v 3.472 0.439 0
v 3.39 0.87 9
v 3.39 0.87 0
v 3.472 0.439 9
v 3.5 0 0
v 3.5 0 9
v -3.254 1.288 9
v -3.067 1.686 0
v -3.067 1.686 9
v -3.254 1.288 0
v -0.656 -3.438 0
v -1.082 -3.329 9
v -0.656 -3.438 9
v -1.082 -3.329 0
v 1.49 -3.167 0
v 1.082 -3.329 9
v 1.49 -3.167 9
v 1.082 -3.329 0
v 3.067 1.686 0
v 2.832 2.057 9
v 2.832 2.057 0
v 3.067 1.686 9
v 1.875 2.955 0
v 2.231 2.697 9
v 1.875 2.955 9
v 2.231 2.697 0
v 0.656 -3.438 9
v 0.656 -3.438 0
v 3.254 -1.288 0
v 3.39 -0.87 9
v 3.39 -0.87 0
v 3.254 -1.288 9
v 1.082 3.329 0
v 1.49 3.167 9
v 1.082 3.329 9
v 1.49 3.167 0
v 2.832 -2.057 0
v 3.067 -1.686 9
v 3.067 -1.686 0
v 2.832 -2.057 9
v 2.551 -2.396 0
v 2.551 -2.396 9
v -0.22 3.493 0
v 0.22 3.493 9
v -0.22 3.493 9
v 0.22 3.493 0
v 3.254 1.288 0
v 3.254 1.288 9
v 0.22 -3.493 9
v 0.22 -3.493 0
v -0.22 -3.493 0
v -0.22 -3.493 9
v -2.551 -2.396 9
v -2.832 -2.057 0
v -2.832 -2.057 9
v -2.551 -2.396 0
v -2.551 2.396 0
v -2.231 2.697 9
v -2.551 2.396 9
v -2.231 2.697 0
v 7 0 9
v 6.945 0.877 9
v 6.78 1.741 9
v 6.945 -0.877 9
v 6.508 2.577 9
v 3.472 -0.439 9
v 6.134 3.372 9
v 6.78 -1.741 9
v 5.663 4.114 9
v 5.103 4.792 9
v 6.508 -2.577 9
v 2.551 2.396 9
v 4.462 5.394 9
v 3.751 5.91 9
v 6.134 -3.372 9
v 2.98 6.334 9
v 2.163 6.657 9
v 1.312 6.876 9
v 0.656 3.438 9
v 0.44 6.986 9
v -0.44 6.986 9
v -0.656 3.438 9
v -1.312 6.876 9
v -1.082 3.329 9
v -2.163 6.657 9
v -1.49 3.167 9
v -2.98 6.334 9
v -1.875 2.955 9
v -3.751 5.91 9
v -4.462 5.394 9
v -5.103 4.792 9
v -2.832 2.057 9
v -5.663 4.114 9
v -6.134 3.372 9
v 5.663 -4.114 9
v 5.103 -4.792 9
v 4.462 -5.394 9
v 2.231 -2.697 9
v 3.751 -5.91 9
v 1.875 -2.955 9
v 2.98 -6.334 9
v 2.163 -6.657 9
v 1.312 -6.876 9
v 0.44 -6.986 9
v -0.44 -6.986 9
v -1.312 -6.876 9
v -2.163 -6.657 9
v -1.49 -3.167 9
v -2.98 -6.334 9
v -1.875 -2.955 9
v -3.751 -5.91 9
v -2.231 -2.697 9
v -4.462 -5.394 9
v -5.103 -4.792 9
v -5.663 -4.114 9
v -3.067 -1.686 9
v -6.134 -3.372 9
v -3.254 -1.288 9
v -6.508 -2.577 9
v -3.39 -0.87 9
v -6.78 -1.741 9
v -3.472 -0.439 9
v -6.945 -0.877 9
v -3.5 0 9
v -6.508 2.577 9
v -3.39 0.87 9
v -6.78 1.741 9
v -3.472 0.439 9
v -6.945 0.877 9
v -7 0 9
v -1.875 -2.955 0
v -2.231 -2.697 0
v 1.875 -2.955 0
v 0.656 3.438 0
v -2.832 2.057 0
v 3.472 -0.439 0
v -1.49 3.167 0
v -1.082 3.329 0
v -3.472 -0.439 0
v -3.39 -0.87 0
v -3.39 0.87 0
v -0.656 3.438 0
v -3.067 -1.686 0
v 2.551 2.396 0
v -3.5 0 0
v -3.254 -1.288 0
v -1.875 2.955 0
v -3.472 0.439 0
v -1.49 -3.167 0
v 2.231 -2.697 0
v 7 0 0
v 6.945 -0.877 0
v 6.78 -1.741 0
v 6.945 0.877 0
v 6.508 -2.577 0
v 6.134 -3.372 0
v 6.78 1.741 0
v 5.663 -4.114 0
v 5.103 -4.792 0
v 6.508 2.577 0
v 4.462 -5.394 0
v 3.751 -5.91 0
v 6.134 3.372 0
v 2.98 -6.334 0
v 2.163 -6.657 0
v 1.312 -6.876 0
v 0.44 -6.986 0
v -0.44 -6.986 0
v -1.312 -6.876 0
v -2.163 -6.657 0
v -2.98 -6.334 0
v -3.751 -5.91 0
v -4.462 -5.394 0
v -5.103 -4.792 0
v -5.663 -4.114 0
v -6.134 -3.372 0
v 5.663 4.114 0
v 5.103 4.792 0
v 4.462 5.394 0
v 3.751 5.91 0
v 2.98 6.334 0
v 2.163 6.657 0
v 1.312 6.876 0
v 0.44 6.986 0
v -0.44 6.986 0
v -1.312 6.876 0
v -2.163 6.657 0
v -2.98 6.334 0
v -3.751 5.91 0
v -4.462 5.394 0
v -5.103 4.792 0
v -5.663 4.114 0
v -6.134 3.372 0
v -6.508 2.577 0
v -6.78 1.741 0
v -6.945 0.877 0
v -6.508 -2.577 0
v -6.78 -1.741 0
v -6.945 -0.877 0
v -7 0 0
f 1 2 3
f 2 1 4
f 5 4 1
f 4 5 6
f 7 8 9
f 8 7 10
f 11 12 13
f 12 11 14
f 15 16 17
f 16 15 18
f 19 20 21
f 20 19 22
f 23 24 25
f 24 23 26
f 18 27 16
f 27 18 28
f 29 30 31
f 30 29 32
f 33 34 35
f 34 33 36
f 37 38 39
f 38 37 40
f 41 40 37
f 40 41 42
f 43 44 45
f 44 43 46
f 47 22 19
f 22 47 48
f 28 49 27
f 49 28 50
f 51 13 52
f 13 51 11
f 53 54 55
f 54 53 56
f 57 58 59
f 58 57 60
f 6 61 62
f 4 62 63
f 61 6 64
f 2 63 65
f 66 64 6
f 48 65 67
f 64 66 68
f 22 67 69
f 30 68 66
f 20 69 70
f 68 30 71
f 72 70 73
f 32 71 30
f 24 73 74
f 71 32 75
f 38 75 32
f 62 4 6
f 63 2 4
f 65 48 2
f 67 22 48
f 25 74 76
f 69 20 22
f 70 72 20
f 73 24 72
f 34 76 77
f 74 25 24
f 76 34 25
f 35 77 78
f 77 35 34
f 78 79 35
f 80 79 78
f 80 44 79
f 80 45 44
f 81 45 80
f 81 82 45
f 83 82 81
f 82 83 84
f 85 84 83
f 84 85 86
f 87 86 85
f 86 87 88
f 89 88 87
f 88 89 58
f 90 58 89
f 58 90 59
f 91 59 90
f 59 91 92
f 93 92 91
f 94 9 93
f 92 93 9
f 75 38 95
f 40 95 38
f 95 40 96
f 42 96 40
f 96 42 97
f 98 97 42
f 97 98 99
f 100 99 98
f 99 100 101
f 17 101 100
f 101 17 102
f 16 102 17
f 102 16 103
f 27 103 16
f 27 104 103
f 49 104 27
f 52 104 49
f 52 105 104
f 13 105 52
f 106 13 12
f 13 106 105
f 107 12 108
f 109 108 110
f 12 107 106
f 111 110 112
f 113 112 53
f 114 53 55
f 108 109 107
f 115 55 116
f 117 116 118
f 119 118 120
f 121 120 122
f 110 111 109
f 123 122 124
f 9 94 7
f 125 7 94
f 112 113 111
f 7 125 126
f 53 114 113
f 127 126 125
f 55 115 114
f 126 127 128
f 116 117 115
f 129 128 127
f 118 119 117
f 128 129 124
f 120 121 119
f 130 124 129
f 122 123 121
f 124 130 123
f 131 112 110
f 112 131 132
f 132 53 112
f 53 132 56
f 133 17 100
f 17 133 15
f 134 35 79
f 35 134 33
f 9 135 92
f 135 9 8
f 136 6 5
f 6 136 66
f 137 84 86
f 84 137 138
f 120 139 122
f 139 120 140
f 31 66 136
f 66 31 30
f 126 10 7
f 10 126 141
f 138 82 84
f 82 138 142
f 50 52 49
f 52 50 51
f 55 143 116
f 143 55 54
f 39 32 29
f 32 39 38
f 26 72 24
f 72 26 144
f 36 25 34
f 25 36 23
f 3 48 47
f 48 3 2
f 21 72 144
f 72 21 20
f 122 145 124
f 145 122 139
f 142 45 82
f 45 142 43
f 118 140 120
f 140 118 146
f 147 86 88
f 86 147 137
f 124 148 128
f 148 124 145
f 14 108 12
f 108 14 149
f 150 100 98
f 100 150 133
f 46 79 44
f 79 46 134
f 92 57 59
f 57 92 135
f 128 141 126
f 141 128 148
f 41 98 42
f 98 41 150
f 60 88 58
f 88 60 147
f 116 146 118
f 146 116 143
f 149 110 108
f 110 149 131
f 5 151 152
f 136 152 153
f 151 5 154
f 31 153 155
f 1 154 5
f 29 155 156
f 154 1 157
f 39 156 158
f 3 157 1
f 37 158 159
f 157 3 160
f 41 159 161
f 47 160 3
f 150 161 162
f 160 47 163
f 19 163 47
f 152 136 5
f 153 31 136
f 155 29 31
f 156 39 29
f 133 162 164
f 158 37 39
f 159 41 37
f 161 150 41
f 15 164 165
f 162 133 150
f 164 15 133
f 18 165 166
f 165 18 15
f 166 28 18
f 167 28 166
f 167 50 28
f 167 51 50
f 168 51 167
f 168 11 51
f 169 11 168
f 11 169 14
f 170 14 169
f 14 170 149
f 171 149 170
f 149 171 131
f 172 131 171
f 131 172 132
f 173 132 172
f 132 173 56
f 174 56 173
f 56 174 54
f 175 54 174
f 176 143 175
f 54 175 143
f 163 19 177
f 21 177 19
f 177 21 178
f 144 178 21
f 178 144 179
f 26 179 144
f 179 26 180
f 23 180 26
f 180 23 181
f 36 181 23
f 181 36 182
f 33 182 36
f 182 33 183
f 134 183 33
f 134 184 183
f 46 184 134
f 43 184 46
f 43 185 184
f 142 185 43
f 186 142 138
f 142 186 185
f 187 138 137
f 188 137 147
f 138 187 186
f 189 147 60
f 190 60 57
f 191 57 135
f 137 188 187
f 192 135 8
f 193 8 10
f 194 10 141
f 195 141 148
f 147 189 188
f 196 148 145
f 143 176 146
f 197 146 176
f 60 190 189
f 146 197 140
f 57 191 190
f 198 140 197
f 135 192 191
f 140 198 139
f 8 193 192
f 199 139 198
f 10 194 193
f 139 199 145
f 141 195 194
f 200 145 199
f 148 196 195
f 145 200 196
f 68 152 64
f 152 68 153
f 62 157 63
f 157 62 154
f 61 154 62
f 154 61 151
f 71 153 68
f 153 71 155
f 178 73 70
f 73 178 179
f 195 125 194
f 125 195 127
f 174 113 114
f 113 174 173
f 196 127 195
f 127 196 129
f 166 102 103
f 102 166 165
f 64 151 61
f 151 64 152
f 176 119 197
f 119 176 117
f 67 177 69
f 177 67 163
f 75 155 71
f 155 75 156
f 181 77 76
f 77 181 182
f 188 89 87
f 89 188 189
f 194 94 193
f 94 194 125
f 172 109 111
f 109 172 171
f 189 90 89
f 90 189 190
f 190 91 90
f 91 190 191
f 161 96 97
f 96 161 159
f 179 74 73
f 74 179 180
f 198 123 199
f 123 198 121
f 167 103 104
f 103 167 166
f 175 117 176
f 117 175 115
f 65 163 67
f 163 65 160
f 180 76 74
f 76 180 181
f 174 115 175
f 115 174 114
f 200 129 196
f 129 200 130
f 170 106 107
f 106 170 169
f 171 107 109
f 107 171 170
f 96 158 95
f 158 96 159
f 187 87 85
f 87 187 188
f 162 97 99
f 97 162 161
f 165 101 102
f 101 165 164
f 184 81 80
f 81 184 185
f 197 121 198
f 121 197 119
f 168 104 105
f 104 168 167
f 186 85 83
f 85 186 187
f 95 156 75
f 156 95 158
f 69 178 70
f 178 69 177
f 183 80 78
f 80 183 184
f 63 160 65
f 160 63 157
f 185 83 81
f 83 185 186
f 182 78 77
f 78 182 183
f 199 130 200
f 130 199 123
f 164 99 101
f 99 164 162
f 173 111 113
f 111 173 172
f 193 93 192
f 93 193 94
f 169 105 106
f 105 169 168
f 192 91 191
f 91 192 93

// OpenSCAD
$fn = 50;

difference() {
	union() {
		cylinder(h = 9, r = 7.0);
	}
	union() {
		translate(v = [0.0, 0.0, -100.0]) {
			cylinder(h = 200, r = 3.25);
		}
		translate(v = [0.0, 0.0, -100.0]) {
			cylinder(h = 200, r = 1.8);
		}
		cylinder(h = 9, r = 3.5);
	}
}
